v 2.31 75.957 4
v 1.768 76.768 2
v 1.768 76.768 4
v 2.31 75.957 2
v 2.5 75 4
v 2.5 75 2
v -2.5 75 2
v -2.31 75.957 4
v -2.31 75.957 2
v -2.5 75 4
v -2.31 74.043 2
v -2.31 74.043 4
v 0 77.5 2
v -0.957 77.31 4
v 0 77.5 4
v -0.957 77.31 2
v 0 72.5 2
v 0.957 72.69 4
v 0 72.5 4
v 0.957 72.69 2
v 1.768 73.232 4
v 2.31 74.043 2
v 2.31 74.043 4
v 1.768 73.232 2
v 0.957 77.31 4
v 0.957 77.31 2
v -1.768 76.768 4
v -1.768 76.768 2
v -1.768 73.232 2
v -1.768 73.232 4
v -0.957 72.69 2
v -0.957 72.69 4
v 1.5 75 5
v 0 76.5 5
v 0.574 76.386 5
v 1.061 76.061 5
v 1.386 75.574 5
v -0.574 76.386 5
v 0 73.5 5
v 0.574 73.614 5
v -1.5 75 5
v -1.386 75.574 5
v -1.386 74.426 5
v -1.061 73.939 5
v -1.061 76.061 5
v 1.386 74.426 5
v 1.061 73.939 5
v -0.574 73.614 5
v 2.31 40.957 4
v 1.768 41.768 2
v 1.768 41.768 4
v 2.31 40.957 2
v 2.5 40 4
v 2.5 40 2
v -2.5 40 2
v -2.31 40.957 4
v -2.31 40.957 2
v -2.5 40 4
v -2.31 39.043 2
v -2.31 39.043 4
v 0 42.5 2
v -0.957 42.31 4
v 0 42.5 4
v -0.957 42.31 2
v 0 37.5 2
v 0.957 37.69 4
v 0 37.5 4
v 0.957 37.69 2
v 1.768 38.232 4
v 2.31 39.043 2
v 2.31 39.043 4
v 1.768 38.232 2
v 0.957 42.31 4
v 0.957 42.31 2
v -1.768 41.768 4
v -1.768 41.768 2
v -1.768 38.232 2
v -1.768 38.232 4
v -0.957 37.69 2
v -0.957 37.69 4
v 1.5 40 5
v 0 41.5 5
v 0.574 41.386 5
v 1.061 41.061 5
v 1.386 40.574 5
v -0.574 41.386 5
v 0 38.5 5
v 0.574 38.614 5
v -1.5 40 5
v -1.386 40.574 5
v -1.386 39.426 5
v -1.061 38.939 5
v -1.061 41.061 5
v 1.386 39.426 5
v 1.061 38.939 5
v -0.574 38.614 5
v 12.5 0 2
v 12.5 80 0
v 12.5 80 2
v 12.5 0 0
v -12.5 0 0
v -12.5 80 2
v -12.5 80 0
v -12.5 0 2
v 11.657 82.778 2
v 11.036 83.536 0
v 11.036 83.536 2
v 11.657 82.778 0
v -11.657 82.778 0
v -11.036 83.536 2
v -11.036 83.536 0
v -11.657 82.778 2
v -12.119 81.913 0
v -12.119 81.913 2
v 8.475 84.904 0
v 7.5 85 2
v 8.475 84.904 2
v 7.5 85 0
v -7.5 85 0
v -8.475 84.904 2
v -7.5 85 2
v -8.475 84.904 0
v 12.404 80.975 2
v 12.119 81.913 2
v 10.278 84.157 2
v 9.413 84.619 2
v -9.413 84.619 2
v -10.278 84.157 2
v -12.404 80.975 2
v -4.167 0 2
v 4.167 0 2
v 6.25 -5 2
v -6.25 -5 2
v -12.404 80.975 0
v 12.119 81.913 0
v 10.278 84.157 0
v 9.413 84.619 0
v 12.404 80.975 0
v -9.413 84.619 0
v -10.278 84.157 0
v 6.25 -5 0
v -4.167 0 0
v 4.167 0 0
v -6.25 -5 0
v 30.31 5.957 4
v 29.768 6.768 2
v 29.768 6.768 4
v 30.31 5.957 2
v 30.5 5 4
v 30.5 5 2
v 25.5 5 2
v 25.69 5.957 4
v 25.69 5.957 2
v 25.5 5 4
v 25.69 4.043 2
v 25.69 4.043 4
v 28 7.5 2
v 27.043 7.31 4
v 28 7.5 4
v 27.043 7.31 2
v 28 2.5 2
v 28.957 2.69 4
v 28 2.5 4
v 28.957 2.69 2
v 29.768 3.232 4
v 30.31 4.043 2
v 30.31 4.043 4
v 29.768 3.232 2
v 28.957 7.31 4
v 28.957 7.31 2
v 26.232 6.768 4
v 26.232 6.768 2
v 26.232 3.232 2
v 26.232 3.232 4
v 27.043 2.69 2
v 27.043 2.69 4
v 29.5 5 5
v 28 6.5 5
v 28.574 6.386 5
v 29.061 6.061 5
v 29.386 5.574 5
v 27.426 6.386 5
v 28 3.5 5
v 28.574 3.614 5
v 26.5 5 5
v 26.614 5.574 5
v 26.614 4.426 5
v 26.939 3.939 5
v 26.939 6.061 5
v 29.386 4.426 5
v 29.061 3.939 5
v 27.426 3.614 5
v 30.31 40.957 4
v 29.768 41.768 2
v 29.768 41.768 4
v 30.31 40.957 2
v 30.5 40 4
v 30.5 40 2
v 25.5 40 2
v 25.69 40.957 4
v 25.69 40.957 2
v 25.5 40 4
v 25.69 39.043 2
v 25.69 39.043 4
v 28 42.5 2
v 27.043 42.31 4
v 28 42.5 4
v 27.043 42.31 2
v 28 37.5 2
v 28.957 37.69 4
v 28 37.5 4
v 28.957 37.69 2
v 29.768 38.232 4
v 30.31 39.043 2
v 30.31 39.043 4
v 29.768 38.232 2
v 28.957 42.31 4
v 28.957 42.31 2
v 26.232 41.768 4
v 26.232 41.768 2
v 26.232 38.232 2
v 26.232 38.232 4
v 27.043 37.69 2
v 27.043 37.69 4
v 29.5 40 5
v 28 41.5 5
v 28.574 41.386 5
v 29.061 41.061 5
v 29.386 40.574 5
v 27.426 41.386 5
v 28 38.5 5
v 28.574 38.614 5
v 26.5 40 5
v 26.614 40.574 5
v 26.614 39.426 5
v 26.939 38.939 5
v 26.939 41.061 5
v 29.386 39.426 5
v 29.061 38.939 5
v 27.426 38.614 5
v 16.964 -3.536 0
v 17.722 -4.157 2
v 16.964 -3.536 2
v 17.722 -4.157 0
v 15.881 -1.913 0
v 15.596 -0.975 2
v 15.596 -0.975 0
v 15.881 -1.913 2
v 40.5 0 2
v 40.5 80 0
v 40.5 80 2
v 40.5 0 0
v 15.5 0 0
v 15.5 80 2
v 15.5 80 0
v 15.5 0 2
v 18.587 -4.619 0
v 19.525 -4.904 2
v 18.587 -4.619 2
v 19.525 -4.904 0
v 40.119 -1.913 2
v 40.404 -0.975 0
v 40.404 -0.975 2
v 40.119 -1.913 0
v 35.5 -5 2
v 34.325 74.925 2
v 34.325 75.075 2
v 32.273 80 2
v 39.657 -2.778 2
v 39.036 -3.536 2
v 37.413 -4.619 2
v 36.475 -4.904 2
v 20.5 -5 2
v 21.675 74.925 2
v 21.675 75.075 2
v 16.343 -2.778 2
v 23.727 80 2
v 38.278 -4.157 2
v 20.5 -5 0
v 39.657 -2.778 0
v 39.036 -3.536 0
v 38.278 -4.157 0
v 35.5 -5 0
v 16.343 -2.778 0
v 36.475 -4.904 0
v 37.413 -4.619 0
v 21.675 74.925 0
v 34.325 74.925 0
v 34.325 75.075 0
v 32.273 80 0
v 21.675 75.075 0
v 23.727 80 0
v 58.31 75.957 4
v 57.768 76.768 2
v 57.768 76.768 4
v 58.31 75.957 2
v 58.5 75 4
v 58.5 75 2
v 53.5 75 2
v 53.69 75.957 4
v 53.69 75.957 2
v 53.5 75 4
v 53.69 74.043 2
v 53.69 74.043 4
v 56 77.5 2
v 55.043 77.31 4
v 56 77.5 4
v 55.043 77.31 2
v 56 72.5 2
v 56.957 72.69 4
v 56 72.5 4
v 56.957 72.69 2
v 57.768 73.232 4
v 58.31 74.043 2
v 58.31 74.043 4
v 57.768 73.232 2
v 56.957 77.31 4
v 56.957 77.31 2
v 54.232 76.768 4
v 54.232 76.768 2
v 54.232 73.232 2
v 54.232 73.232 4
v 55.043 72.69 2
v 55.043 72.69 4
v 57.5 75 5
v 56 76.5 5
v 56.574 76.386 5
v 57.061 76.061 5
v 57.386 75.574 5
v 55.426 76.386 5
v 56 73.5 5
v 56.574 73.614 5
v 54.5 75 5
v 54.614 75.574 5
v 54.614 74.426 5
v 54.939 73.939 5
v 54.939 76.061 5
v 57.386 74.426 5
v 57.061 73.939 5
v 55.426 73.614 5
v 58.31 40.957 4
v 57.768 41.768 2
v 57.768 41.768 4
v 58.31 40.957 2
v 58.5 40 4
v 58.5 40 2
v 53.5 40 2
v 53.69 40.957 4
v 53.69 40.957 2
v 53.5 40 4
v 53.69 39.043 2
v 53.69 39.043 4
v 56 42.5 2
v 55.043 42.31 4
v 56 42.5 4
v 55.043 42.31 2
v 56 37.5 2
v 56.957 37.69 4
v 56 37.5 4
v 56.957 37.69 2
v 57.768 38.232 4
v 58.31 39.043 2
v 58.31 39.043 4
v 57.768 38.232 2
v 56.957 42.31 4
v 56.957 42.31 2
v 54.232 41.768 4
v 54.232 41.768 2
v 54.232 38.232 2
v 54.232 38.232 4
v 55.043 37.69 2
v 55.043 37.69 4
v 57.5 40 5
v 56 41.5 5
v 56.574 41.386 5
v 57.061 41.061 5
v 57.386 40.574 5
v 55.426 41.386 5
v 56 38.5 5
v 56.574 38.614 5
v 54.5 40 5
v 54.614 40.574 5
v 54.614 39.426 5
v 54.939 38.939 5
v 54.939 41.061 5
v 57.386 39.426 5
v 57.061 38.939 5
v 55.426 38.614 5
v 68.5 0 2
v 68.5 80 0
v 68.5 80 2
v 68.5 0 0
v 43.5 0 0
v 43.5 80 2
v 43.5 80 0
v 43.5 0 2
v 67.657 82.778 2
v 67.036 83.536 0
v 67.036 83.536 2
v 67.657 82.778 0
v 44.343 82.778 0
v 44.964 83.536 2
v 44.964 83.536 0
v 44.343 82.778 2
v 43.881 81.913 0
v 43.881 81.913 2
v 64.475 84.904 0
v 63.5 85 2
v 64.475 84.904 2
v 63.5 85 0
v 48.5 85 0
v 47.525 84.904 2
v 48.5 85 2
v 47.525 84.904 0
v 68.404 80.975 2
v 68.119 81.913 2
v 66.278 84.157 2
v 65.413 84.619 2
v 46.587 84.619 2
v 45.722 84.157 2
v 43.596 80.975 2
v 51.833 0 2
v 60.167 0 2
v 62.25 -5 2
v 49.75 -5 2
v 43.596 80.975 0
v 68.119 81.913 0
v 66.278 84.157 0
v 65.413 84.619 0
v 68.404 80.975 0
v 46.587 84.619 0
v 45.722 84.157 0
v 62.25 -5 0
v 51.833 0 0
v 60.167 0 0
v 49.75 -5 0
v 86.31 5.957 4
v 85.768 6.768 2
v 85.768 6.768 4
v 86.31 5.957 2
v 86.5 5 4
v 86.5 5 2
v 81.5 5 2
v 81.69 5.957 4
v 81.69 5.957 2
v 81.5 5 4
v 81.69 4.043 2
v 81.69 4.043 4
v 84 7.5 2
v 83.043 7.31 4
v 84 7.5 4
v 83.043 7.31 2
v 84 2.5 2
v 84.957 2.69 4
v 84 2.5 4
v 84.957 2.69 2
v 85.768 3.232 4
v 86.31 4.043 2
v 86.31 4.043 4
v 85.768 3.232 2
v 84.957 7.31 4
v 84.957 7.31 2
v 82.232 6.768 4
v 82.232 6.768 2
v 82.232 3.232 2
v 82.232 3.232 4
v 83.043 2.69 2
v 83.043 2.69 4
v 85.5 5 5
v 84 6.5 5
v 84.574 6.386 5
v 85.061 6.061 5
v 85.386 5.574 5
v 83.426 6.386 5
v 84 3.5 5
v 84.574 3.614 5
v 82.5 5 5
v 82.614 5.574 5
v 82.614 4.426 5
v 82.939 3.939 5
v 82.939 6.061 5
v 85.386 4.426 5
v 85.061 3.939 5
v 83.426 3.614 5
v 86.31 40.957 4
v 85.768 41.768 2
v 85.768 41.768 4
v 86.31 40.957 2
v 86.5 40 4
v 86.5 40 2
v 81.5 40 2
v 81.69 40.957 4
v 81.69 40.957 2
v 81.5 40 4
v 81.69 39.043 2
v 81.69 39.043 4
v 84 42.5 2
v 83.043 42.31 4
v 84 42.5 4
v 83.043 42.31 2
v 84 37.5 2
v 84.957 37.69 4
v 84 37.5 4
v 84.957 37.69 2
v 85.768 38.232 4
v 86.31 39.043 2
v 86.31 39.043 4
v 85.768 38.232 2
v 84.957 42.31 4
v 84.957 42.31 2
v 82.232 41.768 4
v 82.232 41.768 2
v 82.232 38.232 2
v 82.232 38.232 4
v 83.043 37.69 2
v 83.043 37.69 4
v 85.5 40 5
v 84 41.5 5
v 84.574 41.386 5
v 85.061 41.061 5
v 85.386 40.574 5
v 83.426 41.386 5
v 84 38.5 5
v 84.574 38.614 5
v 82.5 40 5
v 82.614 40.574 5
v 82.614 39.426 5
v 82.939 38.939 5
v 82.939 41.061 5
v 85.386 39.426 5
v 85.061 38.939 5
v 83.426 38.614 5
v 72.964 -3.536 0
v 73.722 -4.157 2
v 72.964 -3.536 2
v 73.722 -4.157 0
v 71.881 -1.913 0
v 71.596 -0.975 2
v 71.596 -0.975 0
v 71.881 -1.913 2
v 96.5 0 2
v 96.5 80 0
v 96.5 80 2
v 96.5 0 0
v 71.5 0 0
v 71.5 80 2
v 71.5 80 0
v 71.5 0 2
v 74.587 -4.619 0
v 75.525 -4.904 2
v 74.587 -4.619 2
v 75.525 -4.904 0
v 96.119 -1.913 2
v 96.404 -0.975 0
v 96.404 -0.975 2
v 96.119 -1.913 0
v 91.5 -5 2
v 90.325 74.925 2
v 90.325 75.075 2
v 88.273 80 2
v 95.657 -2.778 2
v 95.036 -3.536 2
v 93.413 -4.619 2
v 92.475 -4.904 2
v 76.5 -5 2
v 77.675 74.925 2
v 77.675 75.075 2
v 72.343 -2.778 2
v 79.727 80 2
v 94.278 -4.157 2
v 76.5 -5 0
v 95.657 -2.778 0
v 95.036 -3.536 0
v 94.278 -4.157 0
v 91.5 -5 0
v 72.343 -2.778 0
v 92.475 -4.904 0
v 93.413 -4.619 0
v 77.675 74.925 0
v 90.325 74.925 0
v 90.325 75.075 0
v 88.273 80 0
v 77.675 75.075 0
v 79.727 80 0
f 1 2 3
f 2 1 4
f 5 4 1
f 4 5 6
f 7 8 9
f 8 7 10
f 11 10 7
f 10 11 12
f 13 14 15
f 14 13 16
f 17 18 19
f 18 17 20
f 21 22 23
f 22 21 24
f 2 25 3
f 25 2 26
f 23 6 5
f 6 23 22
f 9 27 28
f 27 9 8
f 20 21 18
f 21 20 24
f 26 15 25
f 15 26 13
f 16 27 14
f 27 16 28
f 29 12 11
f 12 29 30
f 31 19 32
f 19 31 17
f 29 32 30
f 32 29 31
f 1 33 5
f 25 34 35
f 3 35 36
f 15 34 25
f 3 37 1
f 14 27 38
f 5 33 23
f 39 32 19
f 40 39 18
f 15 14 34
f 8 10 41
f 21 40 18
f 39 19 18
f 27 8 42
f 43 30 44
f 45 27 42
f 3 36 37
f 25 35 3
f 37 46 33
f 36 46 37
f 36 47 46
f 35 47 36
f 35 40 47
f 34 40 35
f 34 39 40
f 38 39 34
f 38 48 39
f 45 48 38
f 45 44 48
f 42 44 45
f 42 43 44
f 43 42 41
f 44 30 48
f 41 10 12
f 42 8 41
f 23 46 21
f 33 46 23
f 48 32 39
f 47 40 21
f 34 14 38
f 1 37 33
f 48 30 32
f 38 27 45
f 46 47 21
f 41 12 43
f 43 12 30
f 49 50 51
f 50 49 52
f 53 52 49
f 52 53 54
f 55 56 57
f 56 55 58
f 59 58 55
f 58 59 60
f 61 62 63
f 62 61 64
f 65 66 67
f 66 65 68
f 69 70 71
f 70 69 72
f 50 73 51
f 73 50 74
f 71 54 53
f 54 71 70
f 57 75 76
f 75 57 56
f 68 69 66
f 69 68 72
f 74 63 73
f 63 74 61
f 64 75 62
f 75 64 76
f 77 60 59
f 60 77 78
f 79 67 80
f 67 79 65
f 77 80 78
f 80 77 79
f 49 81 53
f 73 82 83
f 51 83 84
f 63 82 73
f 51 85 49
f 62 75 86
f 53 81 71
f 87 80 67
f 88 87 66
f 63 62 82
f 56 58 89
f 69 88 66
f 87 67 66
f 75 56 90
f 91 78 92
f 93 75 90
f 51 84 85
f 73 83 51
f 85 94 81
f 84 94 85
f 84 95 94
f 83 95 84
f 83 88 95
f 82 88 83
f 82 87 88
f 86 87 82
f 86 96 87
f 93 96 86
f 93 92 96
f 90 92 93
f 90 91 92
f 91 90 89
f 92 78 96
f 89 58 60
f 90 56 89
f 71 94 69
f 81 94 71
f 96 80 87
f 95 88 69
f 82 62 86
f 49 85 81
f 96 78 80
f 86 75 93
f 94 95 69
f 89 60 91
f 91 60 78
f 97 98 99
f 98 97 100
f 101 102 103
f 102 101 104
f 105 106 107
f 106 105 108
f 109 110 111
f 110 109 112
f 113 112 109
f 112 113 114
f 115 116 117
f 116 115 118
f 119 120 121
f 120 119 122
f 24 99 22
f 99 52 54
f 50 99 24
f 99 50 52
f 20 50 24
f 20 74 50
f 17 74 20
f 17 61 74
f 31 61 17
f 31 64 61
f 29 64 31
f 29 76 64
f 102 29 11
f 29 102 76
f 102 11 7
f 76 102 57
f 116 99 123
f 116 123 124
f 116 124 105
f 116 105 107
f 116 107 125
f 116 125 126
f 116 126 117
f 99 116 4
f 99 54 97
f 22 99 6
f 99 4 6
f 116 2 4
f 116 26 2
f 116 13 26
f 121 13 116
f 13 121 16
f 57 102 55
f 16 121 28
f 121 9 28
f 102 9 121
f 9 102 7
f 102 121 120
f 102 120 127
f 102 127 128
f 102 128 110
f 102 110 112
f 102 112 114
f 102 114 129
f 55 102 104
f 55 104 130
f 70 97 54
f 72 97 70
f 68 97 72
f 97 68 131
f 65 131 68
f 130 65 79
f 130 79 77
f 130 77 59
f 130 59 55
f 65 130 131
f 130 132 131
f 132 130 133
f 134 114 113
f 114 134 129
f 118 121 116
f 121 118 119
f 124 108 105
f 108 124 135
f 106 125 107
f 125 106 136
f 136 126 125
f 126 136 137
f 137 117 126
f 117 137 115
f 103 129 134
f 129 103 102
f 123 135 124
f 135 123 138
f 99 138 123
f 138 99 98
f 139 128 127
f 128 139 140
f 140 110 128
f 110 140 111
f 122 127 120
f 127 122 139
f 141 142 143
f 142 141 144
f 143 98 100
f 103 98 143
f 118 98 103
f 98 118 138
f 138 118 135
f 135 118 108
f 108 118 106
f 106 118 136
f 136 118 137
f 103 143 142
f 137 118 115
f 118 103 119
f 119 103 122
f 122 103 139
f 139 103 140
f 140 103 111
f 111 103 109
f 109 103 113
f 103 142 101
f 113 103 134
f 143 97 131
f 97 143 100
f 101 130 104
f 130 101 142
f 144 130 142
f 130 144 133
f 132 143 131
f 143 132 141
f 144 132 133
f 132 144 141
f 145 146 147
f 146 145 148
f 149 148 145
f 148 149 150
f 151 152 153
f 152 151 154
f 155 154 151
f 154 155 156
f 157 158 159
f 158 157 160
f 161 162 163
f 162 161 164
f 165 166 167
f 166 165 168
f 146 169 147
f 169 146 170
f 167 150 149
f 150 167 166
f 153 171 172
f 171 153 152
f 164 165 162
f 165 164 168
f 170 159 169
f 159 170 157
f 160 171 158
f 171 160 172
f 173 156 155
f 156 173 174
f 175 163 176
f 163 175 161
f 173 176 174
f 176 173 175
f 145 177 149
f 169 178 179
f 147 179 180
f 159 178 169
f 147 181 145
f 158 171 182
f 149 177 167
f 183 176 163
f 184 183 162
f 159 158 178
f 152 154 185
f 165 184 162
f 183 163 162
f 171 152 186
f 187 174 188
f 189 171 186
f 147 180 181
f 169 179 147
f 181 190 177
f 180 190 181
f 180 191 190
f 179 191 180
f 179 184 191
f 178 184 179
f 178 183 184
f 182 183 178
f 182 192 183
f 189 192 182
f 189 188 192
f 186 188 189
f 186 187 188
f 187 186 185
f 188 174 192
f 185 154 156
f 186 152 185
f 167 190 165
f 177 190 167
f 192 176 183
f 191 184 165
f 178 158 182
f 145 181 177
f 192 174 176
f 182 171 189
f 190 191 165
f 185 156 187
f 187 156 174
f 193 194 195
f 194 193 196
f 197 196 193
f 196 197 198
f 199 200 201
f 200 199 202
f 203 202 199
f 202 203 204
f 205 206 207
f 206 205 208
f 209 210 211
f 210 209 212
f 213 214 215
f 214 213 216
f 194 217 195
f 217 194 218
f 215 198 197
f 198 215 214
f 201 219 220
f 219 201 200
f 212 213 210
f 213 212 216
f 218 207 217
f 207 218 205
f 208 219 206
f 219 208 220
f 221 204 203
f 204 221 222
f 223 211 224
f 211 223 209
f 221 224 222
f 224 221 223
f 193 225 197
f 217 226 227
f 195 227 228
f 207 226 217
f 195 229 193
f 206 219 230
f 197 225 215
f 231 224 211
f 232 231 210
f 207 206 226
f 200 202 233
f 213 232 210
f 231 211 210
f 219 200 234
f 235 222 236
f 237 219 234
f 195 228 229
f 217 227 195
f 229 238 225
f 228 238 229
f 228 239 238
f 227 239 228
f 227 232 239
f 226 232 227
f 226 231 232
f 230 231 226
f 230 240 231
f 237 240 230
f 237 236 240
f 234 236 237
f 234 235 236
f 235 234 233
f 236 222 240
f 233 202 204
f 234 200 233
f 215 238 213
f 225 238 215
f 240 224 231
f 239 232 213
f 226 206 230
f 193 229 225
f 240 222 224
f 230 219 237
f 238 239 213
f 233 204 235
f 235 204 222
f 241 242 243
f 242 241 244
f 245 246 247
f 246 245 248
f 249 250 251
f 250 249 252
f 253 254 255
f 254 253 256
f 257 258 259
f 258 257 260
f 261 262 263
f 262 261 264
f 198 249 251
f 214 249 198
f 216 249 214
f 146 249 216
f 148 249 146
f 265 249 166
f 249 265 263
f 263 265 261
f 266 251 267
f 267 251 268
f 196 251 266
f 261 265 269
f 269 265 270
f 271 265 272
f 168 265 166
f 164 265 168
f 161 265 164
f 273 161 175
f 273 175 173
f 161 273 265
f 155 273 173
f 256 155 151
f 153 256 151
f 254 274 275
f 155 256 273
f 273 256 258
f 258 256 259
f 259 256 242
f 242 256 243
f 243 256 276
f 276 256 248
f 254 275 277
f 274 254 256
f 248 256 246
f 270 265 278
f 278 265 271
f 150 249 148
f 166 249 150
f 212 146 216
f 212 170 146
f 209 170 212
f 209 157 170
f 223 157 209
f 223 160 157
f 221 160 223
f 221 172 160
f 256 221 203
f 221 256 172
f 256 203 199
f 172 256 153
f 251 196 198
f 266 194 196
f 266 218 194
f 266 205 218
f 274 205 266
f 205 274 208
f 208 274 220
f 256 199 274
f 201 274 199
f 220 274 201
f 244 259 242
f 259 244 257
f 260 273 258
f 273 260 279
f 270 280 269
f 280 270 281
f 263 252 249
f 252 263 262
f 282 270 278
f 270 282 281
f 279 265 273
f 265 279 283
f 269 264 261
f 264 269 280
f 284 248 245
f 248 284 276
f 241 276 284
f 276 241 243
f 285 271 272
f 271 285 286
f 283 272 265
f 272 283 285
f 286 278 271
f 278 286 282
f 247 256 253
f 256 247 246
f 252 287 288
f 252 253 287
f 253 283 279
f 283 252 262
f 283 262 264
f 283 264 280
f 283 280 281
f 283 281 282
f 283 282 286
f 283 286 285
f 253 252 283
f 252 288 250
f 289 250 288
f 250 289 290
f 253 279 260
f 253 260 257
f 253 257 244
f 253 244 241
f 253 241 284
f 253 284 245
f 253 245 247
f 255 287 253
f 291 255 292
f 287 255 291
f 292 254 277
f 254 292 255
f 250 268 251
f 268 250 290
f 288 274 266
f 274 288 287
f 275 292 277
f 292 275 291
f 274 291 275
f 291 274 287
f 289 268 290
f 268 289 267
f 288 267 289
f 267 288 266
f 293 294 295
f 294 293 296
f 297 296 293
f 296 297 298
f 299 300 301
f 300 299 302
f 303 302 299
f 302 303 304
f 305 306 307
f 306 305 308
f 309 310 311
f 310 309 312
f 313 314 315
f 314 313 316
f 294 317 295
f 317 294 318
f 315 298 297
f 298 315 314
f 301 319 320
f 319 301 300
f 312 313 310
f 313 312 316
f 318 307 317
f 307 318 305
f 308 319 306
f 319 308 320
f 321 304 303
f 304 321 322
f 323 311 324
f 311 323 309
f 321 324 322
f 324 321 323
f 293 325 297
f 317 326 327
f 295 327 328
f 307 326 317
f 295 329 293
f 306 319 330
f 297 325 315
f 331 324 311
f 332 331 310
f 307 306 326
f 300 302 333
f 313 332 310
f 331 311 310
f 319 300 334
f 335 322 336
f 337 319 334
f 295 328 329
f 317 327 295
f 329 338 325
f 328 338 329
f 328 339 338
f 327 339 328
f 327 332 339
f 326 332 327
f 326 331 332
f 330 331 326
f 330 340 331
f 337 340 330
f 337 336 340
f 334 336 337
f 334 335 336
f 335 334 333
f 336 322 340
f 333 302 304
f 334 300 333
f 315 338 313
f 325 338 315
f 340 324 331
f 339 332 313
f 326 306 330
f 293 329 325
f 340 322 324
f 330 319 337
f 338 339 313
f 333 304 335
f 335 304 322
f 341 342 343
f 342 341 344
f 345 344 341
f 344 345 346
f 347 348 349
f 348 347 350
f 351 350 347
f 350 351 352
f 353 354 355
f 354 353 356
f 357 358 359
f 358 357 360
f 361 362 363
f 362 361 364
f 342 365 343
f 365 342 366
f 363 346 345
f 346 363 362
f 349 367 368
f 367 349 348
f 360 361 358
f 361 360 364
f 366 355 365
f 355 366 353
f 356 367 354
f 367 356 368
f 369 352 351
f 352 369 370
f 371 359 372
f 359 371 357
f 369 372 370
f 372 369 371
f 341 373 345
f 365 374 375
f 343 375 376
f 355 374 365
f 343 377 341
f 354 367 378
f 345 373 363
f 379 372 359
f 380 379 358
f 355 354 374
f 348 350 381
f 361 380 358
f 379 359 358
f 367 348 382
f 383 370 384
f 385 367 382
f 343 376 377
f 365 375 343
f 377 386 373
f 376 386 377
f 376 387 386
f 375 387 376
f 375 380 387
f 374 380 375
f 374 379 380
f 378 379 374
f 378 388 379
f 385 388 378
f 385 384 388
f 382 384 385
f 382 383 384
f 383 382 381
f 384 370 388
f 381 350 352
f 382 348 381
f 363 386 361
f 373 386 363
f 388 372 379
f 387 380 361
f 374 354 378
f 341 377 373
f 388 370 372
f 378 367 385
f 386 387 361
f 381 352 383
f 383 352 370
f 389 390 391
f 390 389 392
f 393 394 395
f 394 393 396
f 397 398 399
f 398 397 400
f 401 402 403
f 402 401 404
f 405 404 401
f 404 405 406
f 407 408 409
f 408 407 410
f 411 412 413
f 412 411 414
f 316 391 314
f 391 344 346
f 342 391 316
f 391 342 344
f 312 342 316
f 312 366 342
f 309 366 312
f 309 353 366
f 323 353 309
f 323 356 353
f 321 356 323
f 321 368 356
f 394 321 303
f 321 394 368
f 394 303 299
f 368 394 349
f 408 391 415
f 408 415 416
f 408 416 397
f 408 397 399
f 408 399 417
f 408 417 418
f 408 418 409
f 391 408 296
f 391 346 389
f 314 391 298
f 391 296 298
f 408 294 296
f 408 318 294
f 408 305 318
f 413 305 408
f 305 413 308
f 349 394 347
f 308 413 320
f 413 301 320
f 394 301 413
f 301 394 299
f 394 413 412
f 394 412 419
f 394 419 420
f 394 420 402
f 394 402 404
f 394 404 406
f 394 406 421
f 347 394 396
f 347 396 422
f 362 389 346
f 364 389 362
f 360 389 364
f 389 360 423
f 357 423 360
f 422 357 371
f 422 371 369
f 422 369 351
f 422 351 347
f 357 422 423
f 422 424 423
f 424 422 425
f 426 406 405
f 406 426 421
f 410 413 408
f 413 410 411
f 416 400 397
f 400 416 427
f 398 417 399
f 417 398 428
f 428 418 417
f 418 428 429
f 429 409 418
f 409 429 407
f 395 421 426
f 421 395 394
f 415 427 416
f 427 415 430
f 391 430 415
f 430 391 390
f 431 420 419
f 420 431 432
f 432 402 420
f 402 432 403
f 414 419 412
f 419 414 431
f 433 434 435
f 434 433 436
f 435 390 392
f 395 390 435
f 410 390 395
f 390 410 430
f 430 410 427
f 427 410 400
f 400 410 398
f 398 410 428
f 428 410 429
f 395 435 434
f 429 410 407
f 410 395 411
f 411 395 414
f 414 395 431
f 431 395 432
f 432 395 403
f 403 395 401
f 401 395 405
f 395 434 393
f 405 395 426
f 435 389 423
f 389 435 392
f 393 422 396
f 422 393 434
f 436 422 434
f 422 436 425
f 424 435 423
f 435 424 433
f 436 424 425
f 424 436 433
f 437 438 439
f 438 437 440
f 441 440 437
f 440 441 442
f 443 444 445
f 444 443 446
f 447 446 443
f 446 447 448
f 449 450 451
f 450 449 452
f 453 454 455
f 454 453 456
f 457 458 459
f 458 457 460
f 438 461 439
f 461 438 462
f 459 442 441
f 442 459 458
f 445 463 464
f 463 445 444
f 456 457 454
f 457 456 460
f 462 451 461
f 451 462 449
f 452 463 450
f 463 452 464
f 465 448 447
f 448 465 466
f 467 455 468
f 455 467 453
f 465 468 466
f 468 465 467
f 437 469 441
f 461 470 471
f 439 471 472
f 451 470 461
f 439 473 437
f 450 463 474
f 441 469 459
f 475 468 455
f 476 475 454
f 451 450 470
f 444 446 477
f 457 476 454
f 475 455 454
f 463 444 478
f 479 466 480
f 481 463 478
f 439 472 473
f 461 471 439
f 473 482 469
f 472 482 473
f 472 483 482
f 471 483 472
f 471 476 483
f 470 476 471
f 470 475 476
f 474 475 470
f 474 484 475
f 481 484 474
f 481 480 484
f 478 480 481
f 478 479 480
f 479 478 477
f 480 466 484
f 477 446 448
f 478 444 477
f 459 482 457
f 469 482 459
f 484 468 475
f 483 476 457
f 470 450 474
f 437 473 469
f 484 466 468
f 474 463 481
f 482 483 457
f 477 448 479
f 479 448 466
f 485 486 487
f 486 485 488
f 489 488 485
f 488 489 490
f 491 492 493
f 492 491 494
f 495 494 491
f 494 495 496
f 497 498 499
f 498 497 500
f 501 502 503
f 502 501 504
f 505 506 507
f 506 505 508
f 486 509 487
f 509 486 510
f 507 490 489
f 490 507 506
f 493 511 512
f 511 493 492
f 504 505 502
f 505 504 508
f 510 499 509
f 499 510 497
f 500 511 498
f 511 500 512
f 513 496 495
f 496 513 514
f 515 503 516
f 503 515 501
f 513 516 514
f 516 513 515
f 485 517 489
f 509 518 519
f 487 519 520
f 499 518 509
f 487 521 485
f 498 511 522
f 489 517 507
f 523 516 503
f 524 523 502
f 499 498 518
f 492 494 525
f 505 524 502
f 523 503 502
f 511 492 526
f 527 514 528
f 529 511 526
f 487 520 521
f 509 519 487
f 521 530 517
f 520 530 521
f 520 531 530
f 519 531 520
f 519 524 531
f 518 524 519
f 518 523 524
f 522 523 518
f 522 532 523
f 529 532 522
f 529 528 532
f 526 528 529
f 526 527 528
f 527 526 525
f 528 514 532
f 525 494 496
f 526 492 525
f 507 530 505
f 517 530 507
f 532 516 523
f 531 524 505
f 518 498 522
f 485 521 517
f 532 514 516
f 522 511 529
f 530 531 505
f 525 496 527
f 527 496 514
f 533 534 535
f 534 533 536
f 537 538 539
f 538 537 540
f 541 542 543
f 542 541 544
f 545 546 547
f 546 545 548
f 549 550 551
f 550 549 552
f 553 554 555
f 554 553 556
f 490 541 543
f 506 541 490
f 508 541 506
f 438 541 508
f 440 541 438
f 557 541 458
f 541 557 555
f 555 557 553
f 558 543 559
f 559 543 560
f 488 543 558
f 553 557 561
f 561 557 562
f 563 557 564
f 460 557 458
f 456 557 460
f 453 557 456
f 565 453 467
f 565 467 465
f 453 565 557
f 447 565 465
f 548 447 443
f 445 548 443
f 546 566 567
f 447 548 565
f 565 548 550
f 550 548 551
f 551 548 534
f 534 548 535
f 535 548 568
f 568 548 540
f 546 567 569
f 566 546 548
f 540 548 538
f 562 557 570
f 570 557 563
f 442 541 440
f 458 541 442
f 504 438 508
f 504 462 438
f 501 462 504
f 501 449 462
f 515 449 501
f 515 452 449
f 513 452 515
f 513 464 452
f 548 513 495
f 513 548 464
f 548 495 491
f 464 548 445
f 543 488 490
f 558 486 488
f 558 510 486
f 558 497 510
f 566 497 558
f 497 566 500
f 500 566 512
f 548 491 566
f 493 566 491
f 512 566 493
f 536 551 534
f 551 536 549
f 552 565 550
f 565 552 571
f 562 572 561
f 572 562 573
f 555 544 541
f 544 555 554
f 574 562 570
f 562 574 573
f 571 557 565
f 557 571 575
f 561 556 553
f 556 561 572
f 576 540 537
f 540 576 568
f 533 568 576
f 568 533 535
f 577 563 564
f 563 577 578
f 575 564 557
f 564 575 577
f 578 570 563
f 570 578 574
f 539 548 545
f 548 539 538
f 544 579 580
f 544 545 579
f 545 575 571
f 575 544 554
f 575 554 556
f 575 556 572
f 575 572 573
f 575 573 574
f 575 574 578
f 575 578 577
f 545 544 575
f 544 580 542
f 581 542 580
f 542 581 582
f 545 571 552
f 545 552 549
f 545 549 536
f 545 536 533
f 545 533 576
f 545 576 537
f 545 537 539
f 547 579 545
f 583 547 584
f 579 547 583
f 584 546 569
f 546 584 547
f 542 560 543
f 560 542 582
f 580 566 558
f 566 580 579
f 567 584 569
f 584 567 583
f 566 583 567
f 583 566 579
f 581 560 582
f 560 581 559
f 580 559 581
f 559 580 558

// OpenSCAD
$fa = 6;
$fs = 1;

roller_part1();
translate([28, 80, 0]) roller_part2();

translate([56,0,0]){
	roller_part1();
	translate([28, 80, 0]) roller_part2();
}

module roller()
{
	union(){
		minkowski() {
			cube([15, 160, 2], true);
			cylinder(1, 5, 5);
		}
		translate([0, -75, 0]) knob();
		translate([0, -40, 0]) knob();
		translate([0, 75, 0]) knob();
		translate([0, 40, 0]) knob();
	}
}

module roller_part1()
{
	union() {
		intersection() {
			roller();
			translate([-25, 0, 0]) cube([50, 100, 10]);
		}
		rotate([0,0,90]) dovetail();
	}
}

module roller_part2()
{
	difference() {
		intersection() {
			roller();
			translate([-25, -100, 0]) cube([50, 100, 10]);
		}
		rotate([0,0,90]) dovetail(false);
	}
}

module knob()
{
	radius =  2.5;
	union() {
		cylinder(4,radius,radius);
		translate([0,0,4]) cylinder(1,radius,radius-1);
	}
}

tolerance = 0.15; //extra space between the parts
knob_height = 5; //the height of the dovetails

module dovetail(male = true, base = 25, width = 2) {
    t = male ? 0 : tolerance;
    translate([ - knob_height, 0, 0])
        rotate([90,0, 90])
            bigger(t)
                trapeze(knob_height, width, base/2, base/3);
}

module trapeze(h, w, r1, r2, center = false) {
    rotate([-90,0,0]) linear_extrude(height = w) projection(false) rotate([90,0,0]) cylinder(h, r1/2, r2/2, center);
}

module bigger(t = tolerance) {
    if (t > 0) {
        minkowski() {
            child(0);
            cube(t, true);
        }
    } else {
        child(0);
    }
}
